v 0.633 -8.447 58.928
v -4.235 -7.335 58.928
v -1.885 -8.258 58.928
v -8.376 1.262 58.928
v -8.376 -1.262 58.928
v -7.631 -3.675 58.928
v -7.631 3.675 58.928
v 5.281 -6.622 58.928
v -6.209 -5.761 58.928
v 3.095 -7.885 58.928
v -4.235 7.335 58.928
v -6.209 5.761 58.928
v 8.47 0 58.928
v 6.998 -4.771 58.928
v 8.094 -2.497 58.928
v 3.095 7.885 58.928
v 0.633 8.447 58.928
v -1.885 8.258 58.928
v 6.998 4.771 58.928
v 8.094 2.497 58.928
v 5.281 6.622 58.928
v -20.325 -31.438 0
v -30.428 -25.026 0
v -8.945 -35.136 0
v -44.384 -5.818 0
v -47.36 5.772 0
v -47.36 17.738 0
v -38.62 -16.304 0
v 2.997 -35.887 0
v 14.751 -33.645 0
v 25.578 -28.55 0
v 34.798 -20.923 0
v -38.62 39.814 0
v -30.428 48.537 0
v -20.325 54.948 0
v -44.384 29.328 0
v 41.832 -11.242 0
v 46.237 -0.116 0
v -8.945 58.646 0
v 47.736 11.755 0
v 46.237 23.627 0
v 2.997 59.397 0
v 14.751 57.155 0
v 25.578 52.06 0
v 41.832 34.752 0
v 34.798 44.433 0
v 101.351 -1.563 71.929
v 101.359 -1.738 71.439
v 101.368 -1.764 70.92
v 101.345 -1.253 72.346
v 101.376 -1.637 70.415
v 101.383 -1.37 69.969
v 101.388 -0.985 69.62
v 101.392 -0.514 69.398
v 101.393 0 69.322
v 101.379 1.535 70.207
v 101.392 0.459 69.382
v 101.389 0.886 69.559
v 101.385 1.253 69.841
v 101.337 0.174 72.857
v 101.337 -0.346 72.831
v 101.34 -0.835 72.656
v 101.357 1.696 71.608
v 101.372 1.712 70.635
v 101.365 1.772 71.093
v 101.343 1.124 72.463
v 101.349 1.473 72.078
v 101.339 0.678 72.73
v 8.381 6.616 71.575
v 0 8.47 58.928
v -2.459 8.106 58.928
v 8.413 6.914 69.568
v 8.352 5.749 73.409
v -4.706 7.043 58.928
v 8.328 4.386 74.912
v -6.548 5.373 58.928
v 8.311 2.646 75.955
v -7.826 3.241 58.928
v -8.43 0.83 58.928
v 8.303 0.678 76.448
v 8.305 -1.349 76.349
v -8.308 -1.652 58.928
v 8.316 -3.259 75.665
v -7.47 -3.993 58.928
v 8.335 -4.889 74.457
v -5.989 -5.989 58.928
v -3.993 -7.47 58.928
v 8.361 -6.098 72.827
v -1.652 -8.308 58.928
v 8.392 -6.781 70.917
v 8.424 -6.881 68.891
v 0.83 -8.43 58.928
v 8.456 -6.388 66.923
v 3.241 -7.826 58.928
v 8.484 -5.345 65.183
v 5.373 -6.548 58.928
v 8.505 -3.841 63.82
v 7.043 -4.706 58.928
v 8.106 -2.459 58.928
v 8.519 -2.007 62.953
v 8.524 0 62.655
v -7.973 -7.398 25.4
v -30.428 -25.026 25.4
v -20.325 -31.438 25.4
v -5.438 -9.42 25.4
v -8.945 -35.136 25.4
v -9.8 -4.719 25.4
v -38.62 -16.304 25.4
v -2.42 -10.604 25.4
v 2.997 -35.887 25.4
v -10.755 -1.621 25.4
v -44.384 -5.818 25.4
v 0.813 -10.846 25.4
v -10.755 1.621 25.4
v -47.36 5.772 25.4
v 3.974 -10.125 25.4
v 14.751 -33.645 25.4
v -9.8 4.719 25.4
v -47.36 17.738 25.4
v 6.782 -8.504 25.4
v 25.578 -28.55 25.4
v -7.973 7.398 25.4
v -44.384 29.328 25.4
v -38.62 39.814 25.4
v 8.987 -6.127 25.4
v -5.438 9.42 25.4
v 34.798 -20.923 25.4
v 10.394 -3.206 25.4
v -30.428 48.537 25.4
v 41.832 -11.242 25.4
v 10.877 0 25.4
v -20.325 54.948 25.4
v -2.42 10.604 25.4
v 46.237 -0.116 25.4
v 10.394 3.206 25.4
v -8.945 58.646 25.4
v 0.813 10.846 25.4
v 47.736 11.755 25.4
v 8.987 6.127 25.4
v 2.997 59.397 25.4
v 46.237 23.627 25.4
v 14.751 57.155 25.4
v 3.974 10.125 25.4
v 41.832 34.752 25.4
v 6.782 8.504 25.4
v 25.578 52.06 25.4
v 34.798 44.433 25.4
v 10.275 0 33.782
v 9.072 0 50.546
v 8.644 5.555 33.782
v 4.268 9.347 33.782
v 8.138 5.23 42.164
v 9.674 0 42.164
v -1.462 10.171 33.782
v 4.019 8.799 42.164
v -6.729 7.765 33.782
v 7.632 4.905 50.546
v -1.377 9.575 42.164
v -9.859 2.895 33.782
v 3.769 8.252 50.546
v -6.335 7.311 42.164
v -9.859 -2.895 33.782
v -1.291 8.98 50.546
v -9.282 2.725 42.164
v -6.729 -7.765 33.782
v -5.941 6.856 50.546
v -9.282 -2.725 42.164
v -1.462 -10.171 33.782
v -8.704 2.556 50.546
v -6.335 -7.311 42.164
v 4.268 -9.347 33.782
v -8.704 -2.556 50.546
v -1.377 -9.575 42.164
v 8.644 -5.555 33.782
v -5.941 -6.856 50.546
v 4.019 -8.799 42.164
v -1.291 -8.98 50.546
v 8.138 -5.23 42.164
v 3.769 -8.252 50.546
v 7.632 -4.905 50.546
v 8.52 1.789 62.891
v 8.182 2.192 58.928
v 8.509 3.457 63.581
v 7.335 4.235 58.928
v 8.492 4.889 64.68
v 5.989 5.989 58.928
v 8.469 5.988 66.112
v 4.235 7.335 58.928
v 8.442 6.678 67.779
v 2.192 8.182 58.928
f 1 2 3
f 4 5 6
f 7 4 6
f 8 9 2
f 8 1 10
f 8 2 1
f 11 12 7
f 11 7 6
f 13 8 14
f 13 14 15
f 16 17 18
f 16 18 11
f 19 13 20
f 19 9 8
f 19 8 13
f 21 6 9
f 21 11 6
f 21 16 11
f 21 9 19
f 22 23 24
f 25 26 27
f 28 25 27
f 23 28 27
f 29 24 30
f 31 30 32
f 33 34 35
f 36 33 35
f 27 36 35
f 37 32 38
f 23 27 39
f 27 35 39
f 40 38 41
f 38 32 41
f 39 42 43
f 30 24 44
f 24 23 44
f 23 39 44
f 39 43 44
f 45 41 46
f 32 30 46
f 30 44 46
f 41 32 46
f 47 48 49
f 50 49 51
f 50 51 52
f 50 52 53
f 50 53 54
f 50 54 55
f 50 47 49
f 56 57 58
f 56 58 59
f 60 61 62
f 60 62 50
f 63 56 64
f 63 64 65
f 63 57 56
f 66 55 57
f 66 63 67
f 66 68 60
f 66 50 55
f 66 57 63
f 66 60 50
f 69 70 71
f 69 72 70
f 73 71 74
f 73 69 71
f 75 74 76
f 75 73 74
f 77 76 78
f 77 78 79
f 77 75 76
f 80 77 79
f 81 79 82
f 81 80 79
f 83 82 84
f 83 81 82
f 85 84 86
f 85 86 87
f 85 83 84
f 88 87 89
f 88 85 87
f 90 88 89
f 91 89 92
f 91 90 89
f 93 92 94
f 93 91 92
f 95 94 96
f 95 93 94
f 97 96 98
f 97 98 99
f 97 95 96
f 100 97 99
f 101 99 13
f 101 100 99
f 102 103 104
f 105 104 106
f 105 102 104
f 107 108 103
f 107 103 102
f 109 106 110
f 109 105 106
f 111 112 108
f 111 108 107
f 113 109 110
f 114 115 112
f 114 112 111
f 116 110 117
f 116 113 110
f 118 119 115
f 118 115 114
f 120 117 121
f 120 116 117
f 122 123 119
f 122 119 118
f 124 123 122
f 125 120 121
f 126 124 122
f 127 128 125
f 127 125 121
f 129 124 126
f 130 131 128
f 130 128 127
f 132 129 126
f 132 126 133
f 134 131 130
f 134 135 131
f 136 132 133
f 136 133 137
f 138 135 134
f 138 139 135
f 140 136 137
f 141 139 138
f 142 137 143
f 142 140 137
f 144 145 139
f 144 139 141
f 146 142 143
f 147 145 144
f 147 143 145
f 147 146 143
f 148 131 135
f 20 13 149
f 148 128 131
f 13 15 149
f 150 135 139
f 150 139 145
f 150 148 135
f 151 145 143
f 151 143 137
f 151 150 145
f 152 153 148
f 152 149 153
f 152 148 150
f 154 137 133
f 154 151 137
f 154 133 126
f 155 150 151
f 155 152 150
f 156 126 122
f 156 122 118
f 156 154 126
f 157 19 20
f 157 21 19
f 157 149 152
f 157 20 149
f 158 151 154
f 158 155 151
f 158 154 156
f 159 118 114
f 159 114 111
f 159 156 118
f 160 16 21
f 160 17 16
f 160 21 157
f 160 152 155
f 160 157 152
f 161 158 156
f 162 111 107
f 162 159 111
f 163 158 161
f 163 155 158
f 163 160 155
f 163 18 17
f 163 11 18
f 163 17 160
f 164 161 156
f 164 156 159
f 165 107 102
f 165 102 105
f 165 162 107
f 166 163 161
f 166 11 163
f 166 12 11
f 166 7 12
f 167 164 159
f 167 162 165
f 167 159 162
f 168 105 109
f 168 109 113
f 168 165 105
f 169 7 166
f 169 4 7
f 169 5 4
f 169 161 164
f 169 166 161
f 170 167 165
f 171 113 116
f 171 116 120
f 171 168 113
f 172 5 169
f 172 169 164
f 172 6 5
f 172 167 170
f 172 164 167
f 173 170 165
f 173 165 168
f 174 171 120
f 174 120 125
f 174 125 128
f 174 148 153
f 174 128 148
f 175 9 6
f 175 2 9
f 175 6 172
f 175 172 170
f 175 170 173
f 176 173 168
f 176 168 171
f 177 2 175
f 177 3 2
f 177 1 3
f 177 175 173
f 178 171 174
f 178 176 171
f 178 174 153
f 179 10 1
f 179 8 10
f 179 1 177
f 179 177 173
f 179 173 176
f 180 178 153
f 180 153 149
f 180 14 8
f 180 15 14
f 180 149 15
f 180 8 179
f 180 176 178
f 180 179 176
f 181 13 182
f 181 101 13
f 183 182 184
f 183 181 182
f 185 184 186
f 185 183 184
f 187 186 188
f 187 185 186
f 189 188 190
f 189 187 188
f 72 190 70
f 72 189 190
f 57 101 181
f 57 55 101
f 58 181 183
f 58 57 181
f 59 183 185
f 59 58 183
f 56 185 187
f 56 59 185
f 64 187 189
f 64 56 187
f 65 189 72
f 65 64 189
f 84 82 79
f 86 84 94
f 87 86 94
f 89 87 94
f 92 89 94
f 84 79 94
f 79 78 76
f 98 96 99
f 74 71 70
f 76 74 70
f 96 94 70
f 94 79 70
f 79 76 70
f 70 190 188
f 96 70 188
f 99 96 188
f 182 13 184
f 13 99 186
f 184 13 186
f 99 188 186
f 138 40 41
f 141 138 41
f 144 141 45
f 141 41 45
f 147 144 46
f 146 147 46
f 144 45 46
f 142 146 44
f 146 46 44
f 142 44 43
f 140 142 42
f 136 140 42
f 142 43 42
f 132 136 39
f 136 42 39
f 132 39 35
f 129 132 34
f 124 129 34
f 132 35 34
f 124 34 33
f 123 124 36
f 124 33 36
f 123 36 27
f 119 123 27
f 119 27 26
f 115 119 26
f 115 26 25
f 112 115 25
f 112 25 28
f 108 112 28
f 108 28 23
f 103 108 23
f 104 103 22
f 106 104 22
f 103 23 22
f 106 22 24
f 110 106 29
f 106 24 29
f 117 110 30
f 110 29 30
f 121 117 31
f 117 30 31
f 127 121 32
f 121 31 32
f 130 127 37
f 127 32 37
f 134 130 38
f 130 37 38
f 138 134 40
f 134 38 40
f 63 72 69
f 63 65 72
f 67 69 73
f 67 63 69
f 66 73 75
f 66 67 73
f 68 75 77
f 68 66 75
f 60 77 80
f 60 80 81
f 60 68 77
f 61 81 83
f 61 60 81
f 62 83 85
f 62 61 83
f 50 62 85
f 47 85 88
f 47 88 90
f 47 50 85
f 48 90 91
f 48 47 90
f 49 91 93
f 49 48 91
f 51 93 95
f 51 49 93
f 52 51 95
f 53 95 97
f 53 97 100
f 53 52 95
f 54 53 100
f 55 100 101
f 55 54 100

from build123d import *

# Parameters (mm, degrees)
F0_R      = 12.7
F2_R      = 8.470294293
F3_FACE_R = 8.470294293
F6_R      = 6.9140661874
F9_R      = 1.7720974012
F11_R     = 47.7364020656
F12_DEPTH = 25.4


with BuildPart() as f3:
    # F0 (on Top) → F3 section 0
    with BuildSketch(Plane.XY):
        Circle(F0_R)
    # F2 (on offset) → F3 section 1
    with BuildSketch(Plane.XY.offset(58.928)):
        Circle(F2_R)
    loft()

    # F11 (on Top) → F12 (join)
    with BuildSketch(Plane.XY):
        with Locations((0, 11.7550967261)):
            Circle(F11_R)
    extrude(amount=F12_DEPTH)


with BuildPart() as f7:
    # F3_face (on face) → F7 section 0
    with BuildSketch(Plane.XY.offset(58.928)):
        Circle(F3_FACE_R)
    # F6 (on line) → F7 section 1
    with BuildSketch(Plane(origin=(9.5261614685, 0, 0.1527230367), x_dir=(0, 1, 0), z_dir=(0.9998715129, 0, 0.0160298998))):
        with Locations((0, 69.4245696068)):
            Circle(F6_R)
    loft()

    # F7_face (on face) → F10 section 0
    with BuildSketch(Plane(origin=(8.4132925743, 0, 69.568372482), x_dir=(0, 1, 0), z_dir=(0.9998715129, 0, 0.0160298998))):
        with BuildLine():
            ThreePointArc((0, -6.9140661874), (4.8889830867, -4.8889830867), (6.9140661874, 0))
            ThreePointArc((6.9140661874, 0), (-4.8889830867, 4.8889830867), (0, -6.9140661874))
        make_face()
    # F9 (on offset) → F10 section 1
    with BuildSketch(Plane(origin=(102.4782167939, 0, 1.6429266412), x_dir=(0, 1, 0), z_dir=(0.9998715129, 0, 0.0160298998))):
        with Locations((0, 69.4594308734)):
            Circle(F9_R)
    loft()


solid = Compound([f3.part, f7.part])
